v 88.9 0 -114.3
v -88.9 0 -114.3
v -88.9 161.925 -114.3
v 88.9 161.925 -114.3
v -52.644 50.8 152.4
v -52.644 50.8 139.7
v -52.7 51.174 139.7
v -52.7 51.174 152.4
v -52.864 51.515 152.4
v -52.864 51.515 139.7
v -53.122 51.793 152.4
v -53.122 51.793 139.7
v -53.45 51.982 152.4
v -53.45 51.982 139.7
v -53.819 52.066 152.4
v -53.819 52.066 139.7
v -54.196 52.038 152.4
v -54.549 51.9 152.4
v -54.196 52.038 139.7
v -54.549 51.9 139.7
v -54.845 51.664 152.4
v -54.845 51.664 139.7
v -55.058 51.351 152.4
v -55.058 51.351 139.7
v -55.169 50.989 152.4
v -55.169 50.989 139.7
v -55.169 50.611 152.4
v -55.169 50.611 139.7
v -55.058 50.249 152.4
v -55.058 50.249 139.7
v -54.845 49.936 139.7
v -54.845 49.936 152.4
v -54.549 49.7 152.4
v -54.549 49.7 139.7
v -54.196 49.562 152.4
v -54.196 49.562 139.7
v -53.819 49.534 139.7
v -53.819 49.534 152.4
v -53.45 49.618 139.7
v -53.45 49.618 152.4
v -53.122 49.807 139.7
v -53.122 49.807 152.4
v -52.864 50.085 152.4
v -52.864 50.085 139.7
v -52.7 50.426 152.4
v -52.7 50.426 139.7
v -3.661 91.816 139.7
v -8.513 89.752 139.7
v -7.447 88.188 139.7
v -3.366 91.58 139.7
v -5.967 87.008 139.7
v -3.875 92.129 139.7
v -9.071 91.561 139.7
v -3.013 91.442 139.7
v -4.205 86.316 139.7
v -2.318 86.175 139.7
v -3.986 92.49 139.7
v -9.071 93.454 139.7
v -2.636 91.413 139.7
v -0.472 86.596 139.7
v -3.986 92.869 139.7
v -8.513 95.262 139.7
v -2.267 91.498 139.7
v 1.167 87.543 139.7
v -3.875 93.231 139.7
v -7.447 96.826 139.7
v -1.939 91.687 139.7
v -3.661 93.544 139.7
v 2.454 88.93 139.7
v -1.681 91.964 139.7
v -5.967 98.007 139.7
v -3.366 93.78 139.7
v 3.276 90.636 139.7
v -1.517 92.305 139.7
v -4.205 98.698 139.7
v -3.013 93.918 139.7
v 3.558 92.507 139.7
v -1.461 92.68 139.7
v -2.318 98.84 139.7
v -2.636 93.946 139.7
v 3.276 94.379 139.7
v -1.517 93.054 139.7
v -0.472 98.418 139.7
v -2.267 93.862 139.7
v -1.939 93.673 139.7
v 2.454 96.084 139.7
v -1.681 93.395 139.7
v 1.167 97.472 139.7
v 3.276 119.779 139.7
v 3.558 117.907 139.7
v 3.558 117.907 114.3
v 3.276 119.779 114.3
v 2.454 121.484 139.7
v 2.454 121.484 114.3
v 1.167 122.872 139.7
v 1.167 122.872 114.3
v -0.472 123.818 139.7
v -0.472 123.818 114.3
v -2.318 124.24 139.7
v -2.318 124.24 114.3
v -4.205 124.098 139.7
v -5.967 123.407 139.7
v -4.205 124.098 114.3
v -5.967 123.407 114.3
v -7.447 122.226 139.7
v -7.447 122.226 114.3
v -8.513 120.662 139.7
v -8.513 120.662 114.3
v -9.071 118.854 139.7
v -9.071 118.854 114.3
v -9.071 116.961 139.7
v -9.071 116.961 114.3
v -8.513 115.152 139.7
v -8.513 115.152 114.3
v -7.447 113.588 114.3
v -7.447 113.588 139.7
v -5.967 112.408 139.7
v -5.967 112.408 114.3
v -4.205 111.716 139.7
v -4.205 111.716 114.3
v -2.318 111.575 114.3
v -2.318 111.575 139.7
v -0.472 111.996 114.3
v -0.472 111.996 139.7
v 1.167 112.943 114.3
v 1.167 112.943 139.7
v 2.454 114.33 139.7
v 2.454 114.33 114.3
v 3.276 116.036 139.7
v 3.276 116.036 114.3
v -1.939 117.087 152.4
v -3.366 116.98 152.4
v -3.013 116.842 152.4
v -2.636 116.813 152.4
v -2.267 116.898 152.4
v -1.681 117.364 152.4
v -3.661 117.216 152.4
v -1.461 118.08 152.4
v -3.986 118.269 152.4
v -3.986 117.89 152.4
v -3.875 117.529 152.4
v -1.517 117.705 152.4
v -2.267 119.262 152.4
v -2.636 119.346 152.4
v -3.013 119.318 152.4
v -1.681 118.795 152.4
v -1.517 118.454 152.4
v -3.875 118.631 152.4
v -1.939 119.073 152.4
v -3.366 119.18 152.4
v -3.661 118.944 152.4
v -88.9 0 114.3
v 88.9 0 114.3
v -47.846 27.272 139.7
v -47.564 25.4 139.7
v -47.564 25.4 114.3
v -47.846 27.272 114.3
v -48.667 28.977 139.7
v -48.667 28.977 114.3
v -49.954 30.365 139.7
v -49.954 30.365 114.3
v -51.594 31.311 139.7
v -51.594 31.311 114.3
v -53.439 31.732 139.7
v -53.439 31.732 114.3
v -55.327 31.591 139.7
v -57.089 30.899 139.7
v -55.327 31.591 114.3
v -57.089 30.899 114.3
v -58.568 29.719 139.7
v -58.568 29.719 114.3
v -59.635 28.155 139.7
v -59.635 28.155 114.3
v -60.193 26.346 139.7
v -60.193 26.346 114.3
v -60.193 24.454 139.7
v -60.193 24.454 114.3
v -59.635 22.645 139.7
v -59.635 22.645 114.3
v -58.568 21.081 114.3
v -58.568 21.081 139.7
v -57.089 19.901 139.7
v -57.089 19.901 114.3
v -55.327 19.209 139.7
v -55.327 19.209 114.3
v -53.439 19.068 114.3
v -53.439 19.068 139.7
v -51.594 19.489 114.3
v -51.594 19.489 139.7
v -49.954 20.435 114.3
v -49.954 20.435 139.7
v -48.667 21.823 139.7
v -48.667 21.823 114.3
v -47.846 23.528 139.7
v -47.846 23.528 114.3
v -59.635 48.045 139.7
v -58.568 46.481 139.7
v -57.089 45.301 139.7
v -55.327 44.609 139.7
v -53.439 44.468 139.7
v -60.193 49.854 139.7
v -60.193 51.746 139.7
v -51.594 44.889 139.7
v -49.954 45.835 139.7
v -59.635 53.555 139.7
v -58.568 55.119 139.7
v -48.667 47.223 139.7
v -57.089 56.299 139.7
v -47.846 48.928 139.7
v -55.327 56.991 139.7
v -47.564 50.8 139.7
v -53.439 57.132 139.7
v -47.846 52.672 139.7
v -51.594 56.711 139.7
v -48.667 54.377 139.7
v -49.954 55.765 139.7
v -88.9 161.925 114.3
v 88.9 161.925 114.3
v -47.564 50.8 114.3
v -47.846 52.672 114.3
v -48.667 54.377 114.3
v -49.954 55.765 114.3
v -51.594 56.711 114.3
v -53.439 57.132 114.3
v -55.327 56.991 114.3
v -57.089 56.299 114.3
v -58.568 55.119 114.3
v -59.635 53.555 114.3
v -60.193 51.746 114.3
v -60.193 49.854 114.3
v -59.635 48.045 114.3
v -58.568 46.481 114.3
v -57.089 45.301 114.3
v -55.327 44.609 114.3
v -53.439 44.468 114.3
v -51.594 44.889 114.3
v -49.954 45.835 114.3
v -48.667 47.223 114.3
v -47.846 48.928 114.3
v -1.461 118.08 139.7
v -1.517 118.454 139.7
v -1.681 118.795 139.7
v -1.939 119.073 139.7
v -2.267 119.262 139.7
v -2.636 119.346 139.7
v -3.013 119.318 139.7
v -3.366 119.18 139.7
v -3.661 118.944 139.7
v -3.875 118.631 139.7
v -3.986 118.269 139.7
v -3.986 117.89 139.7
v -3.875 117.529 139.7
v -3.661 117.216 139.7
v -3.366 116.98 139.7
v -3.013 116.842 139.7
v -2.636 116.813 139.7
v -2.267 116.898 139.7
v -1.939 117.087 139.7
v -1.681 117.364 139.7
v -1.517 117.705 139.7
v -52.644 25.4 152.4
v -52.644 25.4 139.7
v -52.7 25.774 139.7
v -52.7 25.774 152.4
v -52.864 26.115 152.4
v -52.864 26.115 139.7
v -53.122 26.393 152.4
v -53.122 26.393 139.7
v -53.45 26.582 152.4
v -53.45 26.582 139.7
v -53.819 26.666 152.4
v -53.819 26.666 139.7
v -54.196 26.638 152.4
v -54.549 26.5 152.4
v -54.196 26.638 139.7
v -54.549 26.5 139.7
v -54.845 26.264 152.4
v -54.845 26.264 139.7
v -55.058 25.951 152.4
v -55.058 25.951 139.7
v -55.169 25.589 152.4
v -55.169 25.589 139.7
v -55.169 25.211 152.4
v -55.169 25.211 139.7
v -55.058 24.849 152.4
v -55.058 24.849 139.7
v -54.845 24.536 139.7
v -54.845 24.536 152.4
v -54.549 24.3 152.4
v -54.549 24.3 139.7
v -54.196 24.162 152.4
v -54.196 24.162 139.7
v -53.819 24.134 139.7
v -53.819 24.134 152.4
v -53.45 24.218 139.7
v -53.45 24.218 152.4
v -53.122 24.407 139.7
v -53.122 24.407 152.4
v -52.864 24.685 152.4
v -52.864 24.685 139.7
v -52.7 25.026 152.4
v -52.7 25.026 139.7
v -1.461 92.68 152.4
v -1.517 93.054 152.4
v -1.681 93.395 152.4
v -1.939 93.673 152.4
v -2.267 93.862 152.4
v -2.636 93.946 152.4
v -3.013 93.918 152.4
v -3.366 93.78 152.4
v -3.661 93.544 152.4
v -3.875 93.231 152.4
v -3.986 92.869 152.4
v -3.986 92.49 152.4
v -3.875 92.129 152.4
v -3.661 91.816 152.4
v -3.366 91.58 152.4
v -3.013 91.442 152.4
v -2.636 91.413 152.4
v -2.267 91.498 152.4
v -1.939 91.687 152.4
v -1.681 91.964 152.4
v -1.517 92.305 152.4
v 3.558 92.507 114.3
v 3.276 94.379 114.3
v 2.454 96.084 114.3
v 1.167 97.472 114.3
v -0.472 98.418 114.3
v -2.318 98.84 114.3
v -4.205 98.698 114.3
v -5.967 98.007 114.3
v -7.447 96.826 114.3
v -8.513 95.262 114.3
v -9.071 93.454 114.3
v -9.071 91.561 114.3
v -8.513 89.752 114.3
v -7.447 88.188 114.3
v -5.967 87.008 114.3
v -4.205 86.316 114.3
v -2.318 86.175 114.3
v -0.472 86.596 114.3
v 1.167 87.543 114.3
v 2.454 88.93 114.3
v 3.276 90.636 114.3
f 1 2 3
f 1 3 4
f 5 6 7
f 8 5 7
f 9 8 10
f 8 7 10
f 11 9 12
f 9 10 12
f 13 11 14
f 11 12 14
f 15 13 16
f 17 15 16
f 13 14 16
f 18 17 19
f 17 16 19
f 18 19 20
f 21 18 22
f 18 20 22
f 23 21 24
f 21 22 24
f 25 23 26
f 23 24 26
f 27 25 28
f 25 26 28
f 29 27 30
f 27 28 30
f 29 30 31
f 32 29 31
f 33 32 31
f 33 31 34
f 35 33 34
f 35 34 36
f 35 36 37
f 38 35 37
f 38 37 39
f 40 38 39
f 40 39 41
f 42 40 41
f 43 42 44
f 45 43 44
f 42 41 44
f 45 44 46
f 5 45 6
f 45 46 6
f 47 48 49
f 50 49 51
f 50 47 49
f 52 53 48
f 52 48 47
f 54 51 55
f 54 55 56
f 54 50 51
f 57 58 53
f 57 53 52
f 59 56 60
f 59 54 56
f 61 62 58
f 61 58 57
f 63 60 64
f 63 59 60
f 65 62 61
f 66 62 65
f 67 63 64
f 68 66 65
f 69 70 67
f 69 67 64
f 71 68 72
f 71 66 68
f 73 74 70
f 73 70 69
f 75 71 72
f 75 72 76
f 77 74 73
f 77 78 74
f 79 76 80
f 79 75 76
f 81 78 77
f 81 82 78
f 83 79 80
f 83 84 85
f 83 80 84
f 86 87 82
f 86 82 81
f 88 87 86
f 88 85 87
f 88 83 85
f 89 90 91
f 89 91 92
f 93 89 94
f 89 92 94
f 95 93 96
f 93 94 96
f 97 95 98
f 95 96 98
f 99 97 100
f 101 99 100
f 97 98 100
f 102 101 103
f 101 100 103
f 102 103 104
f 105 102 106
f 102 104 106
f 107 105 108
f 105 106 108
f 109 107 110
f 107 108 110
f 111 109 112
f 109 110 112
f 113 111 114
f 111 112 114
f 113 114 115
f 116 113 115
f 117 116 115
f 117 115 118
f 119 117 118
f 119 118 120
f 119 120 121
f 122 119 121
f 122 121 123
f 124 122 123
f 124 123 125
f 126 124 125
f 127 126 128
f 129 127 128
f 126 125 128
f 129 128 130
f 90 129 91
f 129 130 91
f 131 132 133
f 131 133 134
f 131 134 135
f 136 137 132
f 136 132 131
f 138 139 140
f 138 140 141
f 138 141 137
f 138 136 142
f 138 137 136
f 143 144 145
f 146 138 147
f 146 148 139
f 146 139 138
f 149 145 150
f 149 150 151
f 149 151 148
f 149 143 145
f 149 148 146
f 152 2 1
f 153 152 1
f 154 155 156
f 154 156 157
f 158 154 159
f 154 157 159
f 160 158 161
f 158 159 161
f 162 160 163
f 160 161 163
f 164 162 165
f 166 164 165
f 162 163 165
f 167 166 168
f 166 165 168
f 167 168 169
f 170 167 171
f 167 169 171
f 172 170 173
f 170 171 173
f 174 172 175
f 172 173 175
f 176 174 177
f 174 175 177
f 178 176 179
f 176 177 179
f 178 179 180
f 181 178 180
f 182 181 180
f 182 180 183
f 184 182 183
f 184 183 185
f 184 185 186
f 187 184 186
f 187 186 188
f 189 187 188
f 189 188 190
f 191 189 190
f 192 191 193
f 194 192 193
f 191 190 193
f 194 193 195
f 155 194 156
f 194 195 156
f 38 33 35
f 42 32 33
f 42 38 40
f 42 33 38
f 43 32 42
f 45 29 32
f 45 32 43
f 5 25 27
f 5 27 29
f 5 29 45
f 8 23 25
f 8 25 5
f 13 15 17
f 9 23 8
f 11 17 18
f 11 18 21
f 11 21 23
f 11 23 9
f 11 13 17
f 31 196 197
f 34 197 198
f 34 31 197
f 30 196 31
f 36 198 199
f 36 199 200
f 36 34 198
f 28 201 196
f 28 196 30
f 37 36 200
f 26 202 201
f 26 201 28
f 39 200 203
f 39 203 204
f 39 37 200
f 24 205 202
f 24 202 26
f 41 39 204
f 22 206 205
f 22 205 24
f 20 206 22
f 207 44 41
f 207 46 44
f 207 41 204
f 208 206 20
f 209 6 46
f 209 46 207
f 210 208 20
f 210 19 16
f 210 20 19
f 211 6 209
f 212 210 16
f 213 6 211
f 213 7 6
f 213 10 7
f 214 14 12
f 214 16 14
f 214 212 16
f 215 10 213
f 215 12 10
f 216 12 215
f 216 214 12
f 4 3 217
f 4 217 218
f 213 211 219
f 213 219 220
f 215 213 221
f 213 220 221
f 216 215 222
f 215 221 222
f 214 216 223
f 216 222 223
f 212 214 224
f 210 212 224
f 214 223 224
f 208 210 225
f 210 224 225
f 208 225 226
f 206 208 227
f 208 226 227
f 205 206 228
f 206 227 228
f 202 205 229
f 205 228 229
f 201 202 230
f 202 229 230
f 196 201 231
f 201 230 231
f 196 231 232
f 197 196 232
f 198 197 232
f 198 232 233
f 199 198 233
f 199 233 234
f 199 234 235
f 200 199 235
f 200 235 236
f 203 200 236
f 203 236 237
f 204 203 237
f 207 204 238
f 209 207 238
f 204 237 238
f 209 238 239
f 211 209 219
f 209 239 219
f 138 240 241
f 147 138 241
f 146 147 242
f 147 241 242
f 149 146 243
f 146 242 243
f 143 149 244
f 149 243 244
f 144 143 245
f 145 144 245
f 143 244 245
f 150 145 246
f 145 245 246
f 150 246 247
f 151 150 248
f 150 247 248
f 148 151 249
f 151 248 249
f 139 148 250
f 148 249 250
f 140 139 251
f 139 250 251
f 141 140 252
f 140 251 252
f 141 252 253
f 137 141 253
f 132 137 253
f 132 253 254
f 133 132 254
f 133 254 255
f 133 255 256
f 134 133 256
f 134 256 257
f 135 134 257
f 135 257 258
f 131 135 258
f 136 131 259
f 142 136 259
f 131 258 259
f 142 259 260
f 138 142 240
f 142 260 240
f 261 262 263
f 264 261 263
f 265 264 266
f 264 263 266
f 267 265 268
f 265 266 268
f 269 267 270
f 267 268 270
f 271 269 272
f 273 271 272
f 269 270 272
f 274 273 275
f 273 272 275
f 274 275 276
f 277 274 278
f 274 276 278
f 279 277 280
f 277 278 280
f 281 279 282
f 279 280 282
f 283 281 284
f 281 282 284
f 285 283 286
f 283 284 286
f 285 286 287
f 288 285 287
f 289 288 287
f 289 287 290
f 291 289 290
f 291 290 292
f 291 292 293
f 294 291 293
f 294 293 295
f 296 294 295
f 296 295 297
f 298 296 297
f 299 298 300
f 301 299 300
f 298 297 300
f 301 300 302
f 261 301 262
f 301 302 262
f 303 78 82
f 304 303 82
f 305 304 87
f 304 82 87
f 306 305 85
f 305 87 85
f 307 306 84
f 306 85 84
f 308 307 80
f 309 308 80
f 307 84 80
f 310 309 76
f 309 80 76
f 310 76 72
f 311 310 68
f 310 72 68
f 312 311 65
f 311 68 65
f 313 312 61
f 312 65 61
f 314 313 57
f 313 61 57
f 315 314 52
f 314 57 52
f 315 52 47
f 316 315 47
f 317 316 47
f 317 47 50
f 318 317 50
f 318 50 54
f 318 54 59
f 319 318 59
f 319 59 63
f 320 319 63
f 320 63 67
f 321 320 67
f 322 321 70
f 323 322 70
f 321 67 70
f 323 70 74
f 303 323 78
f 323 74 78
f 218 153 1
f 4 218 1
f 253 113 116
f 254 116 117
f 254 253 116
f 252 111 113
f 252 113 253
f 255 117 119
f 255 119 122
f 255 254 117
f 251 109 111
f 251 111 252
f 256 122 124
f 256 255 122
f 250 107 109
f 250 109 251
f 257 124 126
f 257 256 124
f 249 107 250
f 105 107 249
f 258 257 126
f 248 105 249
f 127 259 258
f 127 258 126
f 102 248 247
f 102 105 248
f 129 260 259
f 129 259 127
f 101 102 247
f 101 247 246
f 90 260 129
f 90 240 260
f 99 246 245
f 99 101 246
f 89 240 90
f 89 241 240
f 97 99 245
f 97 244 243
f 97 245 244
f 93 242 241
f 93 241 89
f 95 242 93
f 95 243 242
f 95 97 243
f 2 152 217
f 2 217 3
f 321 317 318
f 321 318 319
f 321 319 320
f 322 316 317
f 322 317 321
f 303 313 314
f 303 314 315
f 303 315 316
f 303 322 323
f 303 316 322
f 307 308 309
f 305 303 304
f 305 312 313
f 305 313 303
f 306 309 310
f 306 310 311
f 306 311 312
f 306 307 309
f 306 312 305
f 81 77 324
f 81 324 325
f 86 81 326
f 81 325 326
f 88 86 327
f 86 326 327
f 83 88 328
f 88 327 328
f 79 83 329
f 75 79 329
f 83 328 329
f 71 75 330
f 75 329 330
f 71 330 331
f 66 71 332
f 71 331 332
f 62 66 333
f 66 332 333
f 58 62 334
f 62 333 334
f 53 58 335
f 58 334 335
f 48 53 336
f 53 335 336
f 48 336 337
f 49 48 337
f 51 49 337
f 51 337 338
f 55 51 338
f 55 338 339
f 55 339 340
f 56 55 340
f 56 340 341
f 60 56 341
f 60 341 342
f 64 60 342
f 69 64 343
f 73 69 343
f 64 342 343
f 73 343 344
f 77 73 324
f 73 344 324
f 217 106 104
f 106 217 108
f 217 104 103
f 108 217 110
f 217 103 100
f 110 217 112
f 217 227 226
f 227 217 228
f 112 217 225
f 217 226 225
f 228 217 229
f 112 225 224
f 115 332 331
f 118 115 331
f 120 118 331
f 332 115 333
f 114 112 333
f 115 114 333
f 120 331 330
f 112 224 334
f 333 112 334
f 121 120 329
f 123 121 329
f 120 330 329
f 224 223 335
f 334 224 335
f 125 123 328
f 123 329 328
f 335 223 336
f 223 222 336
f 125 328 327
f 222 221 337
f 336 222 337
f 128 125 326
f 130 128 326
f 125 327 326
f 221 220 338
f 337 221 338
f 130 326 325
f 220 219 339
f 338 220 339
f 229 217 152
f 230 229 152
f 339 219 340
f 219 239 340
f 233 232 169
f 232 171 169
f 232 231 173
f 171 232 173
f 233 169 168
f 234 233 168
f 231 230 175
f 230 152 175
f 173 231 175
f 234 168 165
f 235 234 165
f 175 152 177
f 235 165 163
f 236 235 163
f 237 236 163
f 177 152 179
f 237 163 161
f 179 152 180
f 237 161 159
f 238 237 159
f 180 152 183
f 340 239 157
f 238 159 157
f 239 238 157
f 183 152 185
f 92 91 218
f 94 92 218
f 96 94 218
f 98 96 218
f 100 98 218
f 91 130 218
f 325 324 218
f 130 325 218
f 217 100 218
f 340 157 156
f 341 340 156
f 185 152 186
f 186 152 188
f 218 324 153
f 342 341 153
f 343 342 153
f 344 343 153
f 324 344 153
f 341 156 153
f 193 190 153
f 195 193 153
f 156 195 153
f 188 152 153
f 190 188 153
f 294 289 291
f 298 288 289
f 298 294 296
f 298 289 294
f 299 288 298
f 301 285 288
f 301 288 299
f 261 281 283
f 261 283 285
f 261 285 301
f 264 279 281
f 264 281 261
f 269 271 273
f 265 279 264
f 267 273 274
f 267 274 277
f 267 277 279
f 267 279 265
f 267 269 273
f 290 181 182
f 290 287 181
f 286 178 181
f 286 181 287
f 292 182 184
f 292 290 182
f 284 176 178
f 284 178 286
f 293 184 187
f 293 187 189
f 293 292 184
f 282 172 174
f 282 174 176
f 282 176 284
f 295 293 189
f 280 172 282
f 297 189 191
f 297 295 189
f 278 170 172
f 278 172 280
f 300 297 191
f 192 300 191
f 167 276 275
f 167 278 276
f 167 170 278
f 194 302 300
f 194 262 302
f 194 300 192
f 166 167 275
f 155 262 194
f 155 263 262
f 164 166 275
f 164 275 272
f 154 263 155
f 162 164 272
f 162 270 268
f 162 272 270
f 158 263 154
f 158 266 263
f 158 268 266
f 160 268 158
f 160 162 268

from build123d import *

# Parameters (mm, degrees)
SKETCH1_W           = 177.8
SKETCH1_H           = 228.6
BOSS_EXTRUDE1_DEPTH = 161.925
SKETCH2_R           = 6.35
BOSS_EXTRUDE2_DEPTH = 25.4
SKETCH4_R           = 6.35
BOSS_EXTRUDE4_DEPTH = 25.4
LPATTERN1_COUNT     = 2
LPATTERN1_PITCH     = 25.4
LPATTERN2_COUNT     = 2
LPATTERN2_PITCH     = 25.4
SKETCH5_R           = 1.27
BOSS_EXTRUDE5_DEPTH = 12.7
LPATTERN3_COUNT     = 2
LPATTERN3_PITCH     = 25.4
SKETCH6_R           = 1.27
BOSS_EXTRUDE6_DEPTH = 12.7
LPATTERN4_COUNT     = 2
LPATTERN4_PITCH     = 25.4


with BuildPart() as part:
    # Sketch1 → Boss-Extrude1 (new body)
    with BuildSketch(Plane(origin=(0, 0, 0), x_dir=(1, 0, 0), z_dir=(0, 1, 0))):
        Rectangle(SKETCH1_W, SKETCH1_H)
    extrude(amount=BOSS_EXTRUDE1_DEPTH)

    # Sketch2 → Boss-Extrude2 (add)
    with BuildSketch(Plane.XY.offset(114.3)):
        with Locations((-2.792336917, 117.907265363)):
            Circle(SKETCH2_R)
    boss_extrude2 = extrude(amount=BOSS_EXTRUDE2_DEPTH)

    # Sketch4 → Boss-Extrude4 (add)
    with BuildSketch(Plane.XY.offset(114.3)):
        with Locations((-53.913582013, 25.4)):
            Circle(SKETCH4_R)
    boss_extrude4 = extrude(amount=BOSS_EXTRUDE4_DEPTH)

    # LPattern1: Boss-Extrude2 ×2
    with Locations(*[(0, -i * LPATTERN1_PITCH, 0) for i in range(1, LPATTERN1_COUNT)]):
        add(boss_extrude2)

    # LPattern2: Boss-Extrude4 ×2
    with Locations(*[(0, i * LPATTERN2_PITCH, 0) for i in range(1, LPATTERN2_COUNT)]):
        add(boss_extrude4)

    # Sketch5 → Boss-Extrude5 (add)
    with BuildSketch(Plane.XY.offset(139.7)):
        with Locations((-2.730512125, 118.079738131)):
            Circle(SKETCH5_R)
    boss_extrude5 = extrude(amount=BOSS_EXTRUDE5_DEPTH)

    # LPattern3: Boss-Extrude5 ×2
    with Locations(*[(0, -i * LPATTERN3_PITCH, 0) for i in range(1, LPATTERN3_COUNT)]):
        add(boss_extrude5)

    # Sketch6 → Boss-Extrude6 (add)
    with BuildSketch(Plane.XY.offset(139.7)):
        with Locations((-53.913582013, 50.8)):
            Circle(SKETCH6_R)
    boss_extrude6 = extrude(amount=BOSS_EXTRUDE6_DEPTH)

    # LPattern4: Boss-Extrude6 ×2
    with Locations(*[(0, -i * LPATTERN4_PITCH, 0) for i in range(1, LPATTERN4_COUNT)]):
        add(boss_extrude6)


solid = part.part
